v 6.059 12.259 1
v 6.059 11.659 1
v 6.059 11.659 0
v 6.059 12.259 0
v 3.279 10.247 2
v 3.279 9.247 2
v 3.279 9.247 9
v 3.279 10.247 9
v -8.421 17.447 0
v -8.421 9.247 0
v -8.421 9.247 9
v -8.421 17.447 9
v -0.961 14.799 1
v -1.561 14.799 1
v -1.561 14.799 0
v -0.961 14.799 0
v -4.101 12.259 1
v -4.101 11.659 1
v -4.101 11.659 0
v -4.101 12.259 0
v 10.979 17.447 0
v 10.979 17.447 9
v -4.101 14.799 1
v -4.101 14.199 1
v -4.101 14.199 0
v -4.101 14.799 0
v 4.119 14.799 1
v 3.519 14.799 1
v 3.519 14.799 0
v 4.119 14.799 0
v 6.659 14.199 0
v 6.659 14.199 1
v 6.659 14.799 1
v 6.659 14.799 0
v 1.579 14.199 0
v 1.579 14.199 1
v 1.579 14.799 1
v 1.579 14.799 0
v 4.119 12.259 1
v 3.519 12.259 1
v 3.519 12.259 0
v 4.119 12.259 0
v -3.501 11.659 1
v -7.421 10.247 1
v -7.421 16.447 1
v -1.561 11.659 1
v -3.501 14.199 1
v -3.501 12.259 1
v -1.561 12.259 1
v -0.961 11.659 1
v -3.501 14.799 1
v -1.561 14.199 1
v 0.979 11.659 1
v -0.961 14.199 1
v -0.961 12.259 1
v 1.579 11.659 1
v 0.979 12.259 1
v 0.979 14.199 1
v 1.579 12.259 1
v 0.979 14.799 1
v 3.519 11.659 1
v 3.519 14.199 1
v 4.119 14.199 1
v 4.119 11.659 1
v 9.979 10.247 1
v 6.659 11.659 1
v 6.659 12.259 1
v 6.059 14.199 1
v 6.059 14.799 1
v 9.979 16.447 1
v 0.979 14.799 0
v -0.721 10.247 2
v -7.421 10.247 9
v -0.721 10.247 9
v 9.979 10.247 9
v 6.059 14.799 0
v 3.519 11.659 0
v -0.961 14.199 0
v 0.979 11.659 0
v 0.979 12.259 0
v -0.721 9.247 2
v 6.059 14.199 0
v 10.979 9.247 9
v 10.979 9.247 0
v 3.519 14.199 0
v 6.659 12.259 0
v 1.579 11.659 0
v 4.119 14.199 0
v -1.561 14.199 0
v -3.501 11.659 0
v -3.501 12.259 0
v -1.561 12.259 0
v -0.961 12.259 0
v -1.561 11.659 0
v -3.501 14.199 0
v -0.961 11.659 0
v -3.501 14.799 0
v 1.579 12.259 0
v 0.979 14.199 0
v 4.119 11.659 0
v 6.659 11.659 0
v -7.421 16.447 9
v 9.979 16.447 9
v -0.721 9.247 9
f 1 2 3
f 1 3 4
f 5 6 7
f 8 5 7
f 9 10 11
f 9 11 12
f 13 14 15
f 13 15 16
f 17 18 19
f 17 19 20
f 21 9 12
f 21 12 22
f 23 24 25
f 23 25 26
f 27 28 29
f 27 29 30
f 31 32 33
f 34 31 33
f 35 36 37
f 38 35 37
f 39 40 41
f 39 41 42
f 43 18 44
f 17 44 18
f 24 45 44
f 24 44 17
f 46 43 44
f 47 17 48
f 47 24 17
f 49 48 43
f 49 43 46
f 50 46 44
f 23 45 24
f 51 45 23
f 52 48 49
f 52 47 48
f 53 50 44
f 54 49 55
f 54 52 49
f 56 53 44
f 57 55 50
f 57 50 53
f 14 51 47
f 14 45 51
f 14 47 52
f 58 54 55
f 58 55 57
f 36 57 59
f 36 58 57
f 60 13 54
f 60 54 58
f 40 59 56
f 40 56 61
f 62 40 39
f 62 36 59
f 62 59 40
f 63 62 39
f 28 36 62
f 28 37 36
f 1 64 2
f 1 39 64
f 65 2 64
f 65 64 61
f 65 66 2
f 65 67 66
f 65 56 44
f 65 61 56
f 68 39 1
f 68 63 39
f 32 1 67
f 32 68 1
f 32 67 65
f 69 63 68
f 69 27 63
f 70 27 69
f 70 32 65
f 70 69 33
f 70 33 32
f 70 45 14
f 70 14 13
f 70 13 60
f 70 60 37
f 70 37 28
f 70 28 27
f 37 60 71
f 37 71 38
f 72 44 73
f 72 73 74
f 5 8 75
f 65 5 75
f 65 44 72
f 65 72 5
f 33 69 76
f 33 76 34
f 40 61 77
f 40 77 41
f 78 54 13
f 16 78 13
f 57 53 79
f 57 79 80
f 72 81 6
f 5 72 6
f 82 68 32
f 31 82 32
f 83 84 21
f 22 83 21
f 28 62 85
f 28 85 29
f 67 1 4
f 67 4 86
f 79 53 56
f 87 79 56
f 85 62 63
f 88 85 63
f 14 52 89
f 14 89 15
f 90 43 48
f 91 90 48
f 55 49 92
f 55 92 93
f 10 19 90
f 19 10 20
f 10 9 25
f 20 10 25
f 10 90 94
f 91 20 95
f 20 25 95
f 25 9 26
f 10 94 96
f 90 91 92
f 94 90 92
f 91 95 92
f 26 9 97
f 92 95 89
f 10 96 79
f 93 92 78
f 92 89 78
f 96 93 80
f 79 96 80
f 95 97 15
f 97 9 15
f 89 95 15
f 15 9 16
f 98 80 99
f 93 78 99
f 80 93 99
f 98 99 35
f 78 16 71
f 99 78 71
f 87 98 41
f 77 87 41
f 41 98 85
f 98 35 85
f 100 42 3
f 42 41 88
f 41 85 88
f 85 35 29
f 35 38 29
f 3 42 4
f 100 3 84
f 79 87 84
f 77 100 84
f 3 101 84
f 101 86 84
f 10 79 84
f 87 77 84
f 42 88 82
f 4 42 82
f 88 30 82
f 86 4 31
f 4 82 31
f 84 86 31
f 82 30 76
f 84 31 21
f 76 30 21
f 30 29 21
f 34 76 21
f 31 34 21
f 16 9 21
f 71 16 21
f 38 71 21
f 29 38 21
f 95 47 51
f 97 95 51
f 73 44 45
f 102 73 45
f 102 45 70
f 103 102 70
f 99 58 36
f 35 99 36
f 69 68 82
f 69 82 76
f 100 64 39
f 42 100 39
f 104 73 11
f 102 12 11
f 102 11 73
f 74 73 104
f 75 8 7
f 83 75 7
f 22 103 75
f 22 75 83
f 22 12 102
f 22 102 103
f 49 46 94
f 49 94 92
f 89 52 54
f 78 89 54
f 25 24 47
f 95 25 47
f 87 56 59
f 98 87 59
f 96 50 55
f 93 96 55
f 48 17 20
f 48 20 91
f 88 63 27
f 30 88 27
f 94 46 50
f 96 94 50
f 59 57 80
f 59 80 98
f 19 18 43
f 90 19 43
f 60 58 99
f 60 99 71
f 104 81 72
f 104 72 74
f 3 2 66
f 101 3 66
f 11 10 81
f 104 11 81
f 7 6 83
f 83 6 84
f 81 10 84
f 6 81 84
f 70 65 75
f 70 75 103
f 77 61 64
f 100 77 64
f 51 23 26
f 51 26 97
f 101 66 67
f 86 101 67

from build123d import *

# Parameters (mm, degrees)
F0_W     = 17.4
F0_H     = 6.2
F1_DEPTH = 1
F0_W_2   = 19.4
F0_H_2   = 8.2
F2_DEPTH = 9
F3_W     = 4
F3_H     = 7
F4_DEPTH = 2
F5_W     = 0.6
F5_H     = 0.6
F6_DEPTH = 25


with BuildPart() as f1:
    # F0 (on Top) → F1 (new body)
    with BuildSketch(Plane.XY):
        with Locations((1.278801, 13.346958)):
            Rectangle(F0_W, F0_H)
    extrude(amount=F1_DEPTH)

    # F0 (on Top) → F2 (join)
    with BuildSketch(Plane.XY):
        with Locations((1.278801, 13.346958)):
            Rectangle(F0_W_2, F0_H_2)
        with Locations((1.278801, 13.346958)):
            Rectangle(F0_W, F0_H, mode=Mode.SUBTRACT)
    extrude(amount=F2_DEPTH)

    # F3 (on face) → F4 (cut)
    with BuildSketch(Plane.XZ.offset(-9.246958)):
        with Locations((1.278801, 5.5)):
            Rectangle(F3_W, F3_H)
    extrude(amount=-F4_DEPTH, mode=Mode.SUBTRACT)

    # F5 (on face) → F6 (cut)
    with BuildSketch(Plane.XY.offset(1)):
        with Locations((-3.801199, 11.958958)):
            Rectangle(F5_W, F5_H)
        with Locations((-3.801199, 14.498958)):
            Rectangle(F5_W, F5_H)
        with Locations((-1.261199, 14.498958)):
            Rectangle(F5_W, F5_H)
        with Locations((-1.261199, 11.958958)):
            Rectangle(F5_W, F5_H)
        with Locations((1.278801, 11.958958)):
            Rectangle(F5_W, F5_H)
        with Locations((1.278801, 14.498958)):
            Rectangle(F5_W, F5_H)
        with Locations((3.818801, 11.958958)):
            Rectangle(F5_W, F5_H)
        with Locations((3.818801, 14.498958)):
            Rectangle(F5_W, F5_H)
        with Locations((6.358801, 14.498958)):
            Rectangle(F5_W, F5_H)
        with Locations((6.358801, 11.958958)):
            Rectangle(F5_W, F5_H)
    extrude(amount=-F6_DEPTH, mode=Mode.SUBTRACT)


solid = f1.part
